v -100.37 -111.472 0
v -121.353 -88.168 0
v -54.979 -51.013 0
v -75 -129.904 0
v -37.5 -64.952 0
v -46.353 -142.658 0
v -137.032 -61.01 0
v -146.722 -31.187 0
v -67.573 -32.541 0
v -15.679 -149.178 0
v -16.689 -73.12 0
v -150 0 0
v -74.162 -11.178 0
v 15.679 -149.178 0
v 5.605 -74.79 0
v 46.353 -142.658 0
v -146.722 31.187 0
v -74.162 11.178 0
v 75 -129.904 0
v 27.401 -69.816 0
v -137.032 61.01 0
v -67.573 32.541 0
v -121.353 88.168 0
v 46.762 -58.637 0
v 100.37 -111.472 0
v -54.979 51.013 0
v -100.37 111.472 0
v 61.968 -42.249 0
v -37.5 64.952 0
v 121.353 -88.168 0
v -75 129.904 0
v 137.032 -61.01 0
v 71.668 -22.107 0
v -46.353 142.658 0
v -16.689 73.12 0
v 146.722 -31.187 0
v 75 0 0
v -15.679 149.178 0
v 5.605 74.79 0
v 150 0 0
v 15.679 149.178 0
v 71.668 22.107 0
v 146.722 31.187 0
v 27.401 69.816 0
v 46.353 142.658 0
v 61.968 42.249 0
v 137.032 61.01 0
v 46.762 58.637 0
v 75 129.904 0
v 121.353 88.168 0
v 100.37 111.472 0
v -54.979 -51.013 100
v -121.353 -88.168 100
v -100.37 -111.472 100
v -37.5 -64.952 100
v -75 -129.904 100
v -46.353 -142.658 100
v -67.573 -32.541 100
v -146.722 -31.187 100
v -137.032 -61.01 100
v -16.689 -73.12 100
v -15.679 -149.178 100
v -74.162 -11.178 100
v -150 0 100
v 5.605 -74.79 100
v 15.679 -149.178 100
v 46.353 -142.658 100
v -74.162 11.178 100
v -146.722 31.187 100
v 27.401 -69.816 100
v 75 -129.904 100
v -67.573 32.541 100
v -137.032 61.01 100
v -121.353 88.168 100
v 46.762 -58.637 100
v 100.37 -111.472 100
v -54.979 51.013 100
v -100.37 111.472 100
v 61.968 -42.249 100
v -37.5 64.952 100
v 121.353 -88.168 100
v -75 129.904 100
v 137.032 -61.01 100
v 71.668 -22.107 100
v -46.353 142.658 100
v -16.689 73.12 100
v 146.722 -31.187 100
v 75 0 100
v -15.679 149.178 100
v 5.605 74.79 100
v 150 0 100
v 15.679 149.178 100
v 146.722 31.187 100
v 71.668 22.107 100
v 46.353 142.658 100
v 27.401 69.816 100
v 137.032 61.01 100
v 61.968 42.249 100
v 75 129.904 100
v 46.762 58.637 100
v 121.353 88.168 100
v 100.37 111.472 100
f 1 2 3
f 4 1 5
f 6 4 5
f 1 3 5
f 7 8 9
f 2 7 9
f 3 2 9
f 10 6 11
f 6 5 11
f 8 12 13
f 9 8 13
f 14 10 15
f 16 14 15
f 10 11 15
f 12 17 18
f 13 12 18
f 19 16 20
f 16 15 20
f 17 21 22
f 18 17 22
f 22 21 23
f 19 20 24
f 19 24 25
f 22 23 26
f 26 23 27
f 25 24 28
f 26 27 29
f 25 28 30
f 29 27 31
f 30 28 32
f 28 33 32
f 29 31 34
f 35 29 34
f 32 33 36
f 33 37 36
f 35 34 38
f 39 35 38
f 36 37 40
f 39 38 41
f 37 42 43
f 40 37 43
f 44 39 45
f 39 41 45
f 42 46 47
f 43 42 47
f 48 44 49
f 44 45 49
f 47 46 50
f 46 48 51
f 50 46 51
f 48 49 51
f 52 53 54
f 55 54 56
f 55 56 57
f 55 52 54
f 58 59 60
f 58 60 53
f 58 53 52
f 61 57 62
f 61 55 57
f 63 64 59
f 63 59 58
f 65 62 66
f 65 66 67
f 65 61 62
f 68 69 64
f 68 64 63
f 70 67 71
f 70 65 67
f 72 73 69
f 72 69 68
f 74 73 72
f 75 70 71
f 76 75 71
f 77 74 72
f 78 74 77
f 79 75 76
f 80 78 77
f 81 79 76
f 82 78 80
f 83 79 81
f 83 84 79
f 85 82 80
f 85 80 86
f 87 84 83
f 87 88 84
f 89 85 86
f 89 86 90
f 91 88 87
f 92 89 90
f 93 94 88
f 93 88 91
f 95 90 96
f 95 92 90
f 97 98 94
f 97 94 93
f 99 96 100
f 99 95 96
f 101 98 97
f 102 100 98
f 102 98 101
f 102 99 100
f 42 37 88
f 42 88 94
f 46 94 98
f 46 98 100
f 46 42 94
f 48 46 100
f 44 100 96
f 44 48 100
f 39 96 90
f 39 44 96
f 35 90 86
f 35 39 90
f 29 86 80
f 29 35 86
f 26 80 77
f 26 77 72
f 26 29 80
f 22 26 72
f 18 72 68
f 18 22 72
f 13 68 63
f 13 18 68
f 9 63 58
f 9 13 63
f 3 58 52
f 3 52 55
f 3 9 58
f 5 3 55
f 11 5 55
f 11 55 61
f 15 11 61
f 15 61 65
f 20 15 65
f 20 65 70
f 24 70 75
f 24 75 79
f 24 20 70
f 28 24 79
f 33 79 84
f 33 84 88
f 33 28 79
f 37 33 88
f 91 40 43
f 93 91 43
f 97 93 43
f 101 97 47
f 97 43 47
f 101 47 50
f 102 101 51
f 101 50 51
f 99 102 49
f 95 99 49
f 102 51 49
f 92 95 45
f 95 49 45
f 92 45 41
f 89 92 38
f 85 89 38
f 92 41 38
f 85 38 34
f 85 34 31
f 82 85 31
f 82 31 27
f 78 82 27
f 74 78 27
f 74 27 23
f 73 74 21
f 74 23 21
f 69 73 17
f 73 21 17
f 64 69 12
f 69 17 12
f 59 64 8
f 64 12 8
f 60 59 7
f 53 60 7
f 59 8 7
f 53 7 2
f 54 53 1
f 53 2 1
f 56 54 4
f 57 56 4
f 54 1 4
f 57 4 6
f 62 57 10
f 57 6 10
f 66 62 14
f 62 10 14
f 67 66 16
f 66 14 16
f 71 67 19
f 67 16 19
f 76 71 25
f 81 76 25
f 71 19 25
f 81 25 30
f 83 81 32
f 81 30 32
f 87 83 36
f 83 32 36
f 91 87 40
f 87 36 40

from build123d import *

# Parameters (mm, degrees)
F0_R     = 27.9199968723
F1_DEPTH = 55.372
F3_R     = 150
F3_R_2   = 75
F4_DEPTH = 100


with BuildPart() as f1:
    # F0 (on Top) → F1 (new body)
    with BuildSketch(Plane.XY):
        with Locations((0, -4.4582164846)):
            Circle(F0_R)
    extrude(amount=F1_DEPTH)


with BuildPart() as f4:
    # F3 (on Top) → F4 (new body)
    with BuildSketch(Plane.XY):
        Circle(F3_R)
        Circle(F3_R_2, mode=Mode.SUBTRACT)
    extrude(amount=F4_DEPTH)


solid = f4.part
